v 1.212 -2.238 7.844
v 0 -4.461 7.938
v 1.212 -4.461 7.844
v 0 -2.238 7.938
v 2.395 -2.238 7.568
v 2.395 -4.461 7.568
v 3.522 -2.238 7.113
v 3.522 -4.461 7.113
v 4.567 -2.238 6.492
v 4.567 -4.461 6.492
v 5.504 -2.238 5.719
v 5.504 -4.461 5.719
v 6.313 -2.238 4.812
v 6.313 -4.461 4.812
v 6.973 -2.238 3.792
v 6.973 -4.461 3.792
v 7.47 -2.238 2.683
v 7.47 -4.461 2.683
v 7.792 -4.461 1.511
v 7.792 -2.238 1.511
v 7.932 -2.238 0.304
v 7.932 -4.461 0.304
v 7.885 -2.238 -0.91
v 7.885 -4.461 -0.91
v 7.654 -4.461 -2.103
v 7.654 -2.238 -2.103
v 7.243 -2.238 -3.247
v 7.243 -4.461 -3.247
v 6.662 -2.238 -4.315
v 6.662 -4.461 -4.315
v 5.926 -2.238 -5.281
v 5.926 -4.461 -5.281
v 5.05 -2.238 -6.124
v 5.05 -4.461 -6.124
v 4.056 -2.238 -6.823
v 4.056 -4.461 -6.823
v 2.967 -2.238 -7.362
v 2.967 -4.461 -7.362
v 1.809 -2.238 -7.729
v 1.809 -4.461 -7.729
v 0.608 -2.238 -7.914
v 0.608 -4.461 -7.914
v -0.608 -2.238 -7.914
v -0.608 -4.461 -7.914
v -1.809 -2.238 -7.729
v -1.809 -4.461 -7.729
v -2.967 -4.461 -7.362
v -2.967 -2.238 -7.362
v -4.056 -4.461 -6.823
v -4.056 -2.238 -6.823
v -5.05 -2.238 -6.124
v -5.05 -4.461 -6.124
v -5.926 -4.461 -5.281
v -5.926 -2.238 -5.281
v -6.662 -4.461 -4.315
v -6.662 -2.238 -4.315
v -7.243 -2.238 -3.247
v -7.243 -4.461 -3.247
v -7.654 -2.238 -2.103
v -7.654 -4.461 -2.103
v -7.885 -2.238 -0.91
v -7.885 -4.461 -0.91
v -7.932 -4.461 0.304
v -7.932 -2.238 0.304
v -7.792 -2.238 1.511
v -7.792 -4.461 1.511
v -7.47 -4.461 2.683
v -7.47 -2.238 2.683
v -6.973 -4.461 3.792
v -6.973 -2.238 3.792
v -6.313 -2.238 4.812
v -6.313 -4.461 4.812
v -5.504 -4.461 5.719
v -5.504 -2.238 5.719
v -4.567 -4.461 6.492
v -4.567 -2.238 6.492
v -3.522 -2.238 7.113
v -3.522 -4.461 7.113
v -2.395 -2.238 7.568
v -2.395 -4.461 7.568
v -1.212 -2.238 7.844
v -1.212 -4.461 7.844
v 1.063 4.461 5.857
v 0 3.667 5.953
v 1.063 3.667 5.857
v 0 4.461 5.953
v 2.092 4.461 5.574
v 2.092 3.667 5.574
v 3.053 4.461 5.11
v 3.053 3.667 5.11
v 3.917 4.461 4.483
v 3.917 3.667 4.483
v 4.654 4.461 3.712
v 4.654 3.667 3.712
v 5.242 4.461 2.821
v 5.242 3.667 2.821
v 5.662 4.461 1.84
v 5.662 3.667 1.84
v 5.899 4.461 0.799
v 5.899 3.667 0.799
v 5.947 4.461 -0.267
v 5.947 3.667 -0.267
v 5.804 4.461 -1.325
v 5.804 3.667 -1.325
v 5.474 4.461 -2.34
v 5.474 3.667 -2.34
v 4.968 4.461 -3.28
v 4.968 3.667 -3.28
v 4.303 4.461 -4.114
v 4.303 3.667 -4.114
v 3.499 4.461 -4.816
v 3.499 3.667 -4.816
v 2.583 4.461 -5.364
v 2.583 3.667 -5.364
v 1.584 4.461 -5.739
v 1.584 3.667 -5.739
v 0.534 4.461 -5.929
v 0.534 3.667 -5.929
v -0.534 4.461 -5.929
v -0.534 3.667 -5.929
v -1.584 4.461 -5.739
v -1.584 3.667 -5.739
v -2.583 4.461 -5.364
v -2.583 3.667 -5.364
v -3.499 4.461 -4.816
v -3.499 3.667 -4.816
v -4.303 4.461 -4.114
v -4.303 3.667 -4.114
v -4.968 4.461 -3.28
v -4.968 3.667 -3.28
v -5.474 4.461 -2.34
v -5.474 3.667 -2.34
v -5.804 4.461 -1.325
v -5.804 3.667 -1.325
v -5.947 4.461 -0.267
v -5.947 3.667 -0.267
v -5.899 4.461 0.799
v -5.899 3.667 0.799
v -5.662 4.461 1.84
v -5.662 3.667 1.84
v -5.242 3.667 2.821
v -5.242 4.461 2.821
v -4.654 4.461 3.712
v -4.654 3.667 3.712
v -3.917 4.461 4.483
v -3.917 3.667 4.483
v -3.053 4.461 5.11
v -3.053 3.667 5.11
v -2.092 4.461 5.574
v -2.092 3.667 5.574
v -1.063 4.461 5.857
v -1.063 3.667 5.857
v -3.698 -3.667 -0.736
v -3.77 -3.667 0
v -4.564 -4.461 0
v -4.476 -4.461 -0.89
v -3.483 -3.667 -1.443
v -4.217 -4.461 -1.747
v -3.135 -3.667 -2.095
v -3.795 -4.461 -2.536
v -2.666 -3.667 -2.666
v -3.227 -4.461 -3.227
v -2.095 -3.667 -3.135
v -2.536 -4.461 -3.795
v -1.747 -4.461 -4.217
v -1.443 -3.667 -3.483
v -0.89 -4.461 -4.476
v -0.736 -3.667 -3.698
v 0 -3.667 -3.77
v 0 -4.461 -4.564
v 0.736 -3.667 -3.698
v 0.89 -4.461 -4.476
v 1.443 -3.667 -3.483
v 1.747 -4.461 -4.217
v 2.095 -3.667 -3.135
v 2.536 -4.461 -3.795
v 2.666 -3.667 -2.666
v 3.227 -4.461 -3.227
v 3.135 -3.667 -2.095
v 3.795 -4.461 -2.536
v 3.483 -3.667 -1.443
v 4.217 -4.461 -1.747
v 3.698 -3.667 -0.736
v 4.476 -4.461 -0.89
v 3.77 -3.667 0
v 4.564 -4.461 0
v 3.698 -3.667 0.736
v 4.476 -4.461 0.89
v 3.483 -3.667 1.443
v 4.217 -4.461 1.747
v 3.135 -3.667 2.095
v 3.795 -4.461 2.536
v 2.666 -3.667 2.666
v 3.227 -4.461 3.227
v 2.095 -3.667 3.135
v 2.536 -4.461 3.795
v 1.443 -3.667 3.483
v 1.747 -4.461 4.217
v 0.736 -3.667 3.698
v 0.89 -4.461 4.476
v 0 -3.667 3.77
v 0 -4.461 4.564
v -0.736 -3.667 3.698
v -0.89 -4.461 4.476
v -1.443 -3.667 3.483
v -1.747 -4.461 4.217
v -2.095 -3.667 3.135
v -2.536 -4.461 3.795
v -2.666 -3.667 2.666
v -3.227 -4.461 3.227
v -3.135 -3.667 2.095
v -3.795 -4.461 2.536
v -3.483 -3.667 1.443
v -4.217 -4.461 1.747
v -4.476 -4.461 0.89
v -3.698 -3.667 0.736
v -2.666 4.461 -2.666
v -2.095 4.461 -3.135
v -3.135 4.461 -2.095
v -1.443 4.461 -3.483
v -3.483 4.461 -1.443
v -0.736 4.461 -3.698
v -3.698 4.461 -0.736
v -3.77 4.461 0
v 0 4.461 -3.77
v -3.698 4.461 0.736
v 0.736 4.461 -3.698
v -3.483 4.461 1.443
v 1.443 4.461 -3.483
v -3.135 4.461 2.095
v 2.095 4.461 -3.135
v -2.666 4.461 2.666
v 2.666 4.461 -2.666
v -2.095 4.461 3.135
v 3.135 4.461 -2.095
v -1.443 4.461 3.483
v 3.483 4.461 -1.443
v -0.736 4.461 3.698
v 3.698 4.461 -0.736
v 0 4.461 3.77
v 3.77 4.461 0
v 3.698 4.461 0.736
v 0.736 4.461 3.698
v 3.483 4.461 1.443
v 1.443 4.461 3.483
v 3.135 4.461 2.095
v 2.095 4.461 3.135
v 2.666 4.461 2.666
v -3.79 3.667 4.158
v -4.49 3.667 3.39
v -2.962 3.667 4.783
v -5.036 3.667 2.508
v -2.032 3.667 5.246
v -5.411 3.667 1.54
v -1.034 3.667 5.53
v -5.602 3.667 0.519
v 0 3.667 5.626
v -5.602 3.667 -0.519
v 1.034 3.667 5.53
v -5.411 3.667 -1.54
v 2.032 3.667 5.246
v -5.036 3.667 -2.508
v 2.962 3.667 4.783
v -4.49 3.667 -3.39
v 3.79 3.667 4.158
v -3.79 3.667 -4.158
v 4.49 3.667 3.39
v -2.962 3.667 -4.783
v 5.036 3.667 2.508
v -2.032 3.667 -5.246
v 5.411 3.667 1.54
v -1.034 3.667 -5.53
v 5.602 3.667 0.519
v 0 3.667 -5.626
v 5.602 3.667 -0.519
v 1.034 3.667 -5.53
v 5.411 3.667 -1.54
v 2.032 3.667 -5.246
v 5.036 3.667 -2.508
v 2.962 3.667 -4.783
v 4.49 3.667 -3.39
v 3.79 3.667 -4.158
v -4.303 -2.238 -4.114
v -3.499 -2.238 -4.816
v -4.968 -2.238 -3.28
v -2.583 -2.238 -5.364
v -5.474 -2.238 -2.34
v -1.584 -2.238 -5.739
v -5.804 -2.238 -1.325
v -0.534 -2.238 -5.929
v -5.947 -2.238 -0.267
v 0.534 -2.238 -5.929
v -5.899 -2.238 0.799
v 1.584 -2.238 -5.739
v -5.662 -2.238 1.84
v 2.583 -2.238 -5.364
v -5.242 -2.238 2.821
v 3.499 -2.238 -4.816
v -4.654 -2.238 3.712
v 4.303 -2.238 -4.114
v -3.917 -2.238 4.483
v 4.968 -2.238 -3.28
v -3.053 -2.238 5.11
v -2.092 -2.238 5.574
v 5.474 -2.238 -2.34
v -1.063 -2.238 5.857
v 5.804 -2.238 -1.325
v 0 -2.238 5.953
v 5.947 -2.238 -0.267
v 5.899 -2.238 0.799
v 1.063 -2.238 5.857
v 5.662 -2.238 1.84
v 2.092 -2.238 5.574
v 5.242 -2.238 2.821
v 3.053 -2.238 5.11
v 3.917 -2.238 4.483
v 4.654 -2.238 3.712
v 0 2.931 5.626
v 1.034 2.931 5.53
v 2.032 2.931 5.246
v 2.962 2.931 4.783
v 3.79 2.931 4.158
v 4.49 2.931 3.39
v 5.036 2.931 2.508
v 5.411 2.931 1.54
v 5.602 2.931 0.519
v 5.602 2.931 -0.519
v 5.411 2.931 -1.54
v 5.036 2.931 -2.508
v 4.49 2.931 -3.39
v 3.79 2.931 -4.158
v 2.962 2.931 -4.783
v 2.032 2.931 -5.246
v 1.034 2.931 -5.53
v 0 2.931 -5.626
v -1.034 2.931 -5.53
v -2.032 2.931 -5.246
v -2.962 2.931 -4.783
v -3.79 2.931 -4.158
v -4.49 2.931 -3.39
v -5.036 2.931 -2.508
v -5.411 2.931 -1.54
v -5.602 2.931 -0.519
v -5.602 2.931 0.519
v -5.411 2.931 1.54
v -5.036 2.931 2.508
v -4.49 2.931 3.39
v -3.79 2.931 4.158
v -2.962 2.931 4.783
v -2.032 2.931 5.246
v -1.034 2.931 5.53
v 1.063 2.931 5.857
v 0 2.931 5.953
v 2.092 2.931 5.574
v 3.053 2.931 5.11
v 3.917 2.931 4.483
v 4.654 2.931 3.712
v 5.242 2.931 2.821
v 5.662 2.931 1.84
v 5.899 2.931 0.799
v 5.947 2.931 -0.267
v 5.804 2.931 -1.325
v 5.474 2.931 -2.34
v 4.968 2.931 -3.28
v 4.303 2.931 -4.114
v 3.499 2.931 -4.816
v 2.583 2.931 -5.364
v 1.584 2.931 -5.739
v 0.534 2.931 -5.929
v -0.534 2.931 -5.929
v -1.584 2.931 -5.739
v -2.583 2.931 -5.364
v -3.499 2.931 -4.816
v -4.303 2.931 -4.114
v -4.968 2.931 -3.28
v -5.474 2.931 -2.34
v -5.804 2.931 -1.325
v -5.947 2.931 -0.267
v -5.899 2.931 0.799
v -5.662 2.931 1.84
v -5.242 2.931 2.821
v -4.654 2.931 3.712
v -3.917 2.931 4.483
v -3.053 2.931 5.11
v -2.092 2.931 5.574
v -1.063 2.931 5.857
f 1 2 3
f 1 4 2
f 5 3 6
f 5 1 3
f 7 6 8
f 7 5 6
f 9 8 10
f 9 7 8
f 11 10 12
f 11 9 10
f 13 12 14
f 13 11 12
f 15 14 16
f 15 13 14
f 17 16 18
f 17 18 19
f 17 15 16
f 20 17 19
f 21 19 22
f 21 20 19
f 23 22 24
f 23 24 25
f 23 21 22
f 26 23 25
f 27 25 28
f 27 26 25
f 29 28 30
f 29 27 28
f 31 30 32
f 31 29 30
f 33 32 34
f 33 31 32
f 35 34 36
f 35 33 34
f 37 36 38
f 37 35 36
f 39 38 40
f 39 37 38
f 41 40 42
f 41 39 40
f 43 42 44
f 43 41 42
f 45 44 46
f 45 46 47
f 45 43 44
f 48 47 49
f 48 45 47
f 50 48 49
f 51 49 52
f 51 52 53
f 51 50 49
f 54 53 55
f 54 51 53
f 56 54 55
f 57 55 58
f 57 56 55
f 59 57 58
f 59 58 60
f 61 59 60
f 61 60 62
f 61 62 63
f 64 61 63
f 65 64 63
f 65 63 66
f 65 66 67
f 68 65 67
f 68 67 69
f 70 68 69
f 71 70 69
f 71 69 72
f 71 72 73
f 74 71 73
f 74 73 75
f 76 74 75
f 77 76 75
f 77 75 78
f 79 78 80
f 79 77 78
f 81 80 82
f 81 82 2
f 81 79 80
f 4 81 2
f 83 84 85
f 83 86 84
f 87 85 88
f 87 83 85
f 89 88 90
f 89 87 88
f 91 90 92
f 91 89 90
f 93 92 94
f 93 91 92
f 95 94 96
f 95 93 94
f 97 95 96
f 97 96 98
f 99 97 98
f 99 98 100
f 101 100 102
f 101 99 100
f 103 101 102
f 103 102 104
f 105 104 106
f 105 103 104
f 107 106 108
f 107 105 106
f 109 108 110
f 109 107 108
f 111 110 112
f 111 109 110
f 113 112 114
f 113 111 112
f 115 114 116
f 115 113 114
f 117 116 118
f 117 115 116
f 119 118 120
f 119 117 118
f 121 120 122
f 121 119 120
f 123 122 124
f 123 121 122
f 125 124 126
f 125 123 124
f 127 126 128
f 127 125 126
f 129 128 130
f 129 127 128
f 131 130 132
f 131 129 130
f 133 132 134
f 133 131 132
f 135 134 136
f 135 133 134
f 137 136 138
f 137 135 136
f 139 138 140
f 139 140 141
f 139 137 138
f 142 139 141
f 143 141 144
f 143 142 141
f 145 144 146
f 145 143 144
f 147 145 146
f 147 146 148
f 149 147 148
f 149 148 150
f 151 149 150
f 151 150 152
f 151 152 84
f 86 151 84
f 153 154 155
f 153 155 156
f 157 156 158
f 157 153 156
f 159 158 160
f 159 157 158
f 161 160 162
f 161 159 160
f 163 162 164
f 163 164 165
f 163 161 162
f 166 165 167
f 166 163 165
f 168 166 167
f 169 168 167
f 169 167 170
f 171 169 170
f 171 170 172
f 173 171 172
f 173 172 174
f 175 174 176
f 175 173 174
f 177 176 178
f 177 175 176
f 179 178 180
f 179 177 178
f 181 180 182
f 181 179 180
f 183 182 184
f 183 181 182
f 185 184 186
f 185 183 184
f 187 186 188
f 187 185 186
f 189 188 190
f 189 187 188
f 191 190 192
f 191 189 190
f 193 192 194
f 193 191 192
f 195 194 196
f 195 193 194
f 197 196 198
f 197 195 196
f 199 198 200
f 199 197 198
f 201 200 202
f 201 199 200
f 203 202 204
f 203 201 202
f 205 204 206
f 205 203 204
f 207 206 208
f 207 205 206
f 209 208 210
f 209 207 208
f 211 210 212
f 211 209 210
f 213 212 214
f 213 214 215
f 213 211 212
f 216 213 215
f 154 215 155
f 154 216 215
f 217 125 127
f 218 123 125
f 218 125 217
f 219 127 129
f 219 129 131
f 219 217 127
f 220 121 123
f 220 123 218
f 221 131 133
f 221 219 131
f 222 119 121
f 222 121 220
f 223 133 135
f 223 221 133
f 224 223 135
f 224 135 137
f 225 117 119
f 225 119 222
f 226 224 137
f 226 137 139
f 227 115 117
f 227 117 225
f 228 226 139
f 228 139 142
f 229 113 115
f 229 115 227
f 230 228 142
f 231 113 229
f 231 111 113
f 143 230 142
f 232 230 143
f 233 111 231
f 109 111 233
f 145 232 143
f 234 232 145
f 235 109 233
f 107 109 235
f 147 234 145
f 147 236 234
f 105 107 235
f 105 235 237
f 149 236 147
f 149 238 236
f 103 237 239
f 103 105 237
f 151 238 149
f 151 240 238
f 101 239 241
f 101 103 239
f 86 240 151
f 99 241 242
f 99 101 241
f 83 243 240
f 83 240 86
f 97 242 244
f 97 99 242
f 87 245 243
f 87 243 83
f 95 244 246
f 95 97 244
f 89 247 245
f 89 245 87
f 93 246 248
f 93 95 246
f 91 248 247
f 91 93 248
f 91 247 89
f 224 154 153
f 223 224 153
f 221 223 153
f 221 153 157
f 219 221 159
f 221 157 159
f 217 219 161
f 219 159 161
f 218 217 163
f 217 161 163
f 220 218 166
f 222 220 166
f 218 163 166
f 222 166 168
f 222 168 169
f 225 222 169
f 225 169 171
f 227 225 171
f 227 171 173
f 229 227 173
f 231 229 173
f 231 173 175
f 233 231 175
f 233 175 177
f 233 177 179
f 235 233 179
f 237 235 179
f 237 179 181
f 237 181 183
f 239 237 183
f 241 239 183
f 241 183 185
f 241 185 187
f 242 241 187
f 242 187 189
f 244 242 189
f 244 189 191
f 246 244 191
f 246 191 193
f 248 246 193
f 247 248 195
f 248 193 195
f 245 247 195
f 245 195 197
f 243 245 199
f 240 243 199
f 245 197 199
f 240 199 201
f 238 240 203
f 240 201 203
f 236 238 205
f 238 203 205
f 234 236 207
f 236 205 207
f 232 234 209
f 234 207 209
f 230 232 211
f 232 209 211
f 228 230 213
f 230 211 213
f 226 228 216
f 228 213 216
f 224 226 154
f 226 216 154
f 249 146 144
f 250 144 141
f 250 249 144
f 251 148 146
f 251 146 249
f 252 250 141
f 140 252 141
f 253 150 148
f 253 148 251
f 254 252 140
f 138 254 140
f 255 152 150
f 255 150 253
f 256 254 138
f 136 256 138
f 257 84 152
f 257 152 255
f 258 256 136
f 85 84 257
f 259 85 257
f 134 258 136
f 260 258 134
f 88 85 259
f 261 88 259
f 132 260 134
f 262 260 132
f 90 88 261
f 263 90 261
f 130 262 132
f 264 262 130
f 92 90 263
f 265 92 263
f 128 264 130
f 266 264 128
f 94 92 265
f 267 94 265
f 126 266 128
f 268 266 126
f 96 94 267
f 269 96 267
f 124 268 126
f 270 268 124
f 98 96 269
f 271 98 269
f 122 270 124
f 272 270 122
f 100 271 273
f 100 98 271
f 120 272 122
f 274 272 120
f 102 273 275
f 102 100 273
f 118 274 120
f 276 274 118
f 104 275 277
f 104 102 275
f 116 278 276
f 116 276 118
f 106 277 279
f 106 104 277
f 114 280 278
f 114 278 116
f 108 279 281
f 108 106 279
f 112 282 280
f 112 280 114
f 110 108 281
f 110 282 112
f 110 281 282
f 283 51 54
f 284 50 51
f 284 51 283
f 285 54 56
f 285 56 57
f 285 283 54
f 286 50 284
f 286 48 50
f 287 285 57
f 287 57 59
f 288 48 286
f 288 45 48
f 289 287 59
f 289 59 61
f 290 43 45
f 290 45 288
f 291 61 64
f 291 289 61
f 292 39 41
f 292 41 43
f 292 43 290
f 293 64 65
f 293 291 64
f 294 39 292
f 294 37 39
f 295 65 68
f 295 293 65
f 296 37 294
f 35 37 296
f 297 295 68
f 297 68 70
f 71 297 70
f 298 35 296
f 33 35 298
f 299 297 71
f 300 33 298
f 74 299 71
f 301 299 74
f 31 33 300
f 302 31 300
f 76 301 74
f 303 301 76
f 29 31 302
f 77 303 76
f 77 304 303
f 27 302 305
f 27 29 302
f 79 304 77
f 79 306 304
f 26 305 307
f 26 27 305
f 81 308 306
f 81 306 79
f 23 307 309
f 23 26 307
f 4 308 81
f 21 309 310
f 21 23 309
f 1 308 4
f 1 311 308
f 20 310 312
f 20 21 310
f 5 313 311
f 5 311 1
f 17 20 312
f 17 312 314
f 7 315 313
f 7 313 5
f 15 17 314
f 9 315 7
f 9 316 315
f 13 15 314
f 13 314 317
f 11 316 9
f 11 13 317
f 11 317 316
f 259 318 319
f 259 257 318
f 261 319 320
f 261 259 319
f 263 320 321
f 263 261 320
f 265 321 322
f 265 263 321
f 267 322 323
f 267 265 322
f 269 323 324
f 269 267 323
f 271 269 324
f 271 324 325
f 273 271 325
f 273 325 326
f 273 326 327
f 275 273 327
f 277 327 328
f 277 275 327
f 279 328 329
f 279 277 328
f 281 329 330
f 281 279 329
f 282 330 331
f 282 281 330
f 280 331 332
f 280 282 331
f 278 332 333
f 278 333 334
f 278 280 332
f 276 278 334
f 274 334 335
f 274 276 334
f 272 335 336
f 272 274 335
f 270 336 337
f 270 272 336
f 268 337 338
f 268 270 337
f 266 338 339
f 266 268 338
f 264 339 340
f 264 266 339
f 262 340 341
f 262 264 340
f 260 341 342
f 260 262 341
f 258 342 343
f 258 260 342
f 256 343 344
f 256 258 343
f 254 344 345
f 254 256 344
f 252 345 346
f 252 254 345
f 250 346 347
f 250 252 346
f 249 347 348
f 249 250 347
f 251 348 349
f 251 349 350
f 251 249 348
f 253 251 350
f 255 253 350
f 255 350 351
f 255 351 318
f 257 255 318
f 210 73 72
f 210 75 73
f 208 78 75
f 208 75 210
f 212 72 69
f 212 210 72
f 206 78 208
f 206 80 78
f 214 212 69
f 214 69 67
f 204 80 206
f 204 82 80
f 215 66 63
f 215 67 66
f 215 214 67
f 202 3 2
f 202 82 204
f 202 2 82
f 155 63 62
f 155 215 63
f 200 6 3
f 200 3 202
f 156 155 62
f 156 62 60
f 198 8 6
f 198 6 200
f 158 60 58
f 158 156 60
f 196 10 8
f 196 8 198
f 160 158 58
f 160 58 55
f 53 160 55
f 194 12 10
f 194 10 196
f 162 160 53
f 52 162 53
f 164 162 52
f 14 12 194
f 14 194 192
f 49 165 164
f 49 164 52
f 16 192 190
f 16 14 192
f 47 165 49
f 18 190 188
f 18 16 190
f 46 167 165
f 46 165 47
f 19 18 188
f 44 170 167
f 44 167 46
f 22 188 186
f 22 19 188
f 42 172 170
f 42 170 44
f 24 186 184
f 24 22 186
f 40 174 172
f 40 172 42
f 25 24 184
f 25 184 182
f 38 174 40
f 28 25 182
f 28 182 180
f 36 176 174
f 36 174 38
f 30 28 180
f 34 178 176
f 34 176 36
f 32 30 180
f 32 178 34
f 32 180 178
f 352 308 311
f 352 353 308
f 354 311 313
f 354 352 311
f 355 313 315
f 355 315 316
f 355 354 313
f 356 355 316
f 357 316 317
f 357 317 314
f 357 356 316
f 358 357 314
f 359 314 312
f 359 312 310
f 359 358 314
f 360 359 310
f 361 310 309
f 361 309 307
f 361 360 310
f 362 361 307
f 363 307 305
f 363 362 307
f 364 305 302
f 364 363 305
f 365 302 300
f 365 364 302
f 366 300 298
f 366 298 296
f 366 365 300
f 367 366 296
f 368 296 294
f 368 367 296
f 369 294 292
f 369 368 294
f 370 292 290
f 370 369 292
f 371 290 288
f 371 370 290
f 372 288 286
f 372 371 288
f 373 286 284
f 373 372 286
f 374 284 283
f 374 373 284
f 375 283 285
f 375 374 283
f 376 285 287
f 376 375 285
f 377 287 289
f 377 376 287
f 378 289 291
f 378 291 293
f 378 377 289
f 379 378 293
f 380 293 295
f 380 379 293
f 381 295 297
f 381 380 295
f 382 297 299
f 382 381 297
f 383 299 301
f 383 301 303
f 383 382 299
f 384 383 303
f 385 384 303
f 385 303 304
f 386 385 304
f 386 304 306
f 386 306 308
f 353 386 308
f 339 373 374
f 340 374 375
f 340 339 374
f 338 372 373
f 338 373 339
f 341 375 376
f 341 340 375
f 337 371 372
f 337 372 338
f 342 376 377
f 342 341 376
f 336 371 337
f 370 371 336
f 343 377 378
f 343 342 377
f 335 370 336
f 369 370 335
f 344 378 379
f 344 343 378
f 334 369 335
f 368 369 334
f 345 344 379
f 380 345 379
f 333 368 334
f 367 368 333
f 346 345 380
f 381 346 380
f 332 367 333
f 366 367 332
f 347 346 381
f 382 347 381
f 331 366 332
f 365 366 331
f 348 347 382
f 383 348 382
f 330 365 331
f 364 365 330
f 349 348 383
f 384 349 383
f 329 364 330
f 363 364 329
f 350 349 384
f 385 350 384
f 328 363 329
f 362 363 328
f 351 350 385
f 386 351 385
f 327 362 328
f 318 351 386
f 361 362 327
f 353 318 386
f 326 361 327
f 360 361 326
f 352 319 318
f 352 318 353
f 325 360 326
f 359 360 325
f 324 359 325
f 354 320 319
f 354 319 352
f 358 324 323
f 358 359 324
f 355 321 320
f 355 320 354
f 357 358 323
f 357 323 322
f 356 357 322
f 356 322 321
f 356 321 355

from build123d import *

# Parameters (mm, degrees)
F_19_64_0_29688_DIAMETER_HOLE1_D = 7.540752
CHAMFER1_SIZE                    = 0.79375


with BuildPart() as part:
    # Sketch1 → Revolve1 (revolve)
    with BuildSketch(Plane(origin=(0, 0, 0), x_dir=(0, 0, -1), z_dir=(1, 0, 0))):
        Polygon((0, -4.460875), (-7.9375, -4.460875), (-7.9375, -2.238375), (-5.953125, -2.238375), (-5.953125, 2.930525), (-5.6261, 2.930525), (-5.6261, 3.667125), (-5.953125, 3.667125), (-5.953125, 4.460875), (0, 4.460875), align=None)
    revolve(axis=Axis((0, 0, 0), (0, 1, 0)))

    # 19/64 (0.29688) Diameter Hole1 (through all)
    with Locations(Plane(origin=(0, 4.460875, 0), x_dir=(1, 0, 0), z_dir=(0, 1, 0))):
        with Locations((0, 0)):
            Hole(F_19_64_0_29688_DIAMETER_HOLE1_D / 2)

    # Chamfer1
    chamfer1_edges = [part.edges().sort_by_distance(p)[0] for p in [
        (3.770376, -4.460875, 0),
    ]]
    chamfer(chamfer1_edges, length=CHAMFER1_SIZE)


solid = part.part
